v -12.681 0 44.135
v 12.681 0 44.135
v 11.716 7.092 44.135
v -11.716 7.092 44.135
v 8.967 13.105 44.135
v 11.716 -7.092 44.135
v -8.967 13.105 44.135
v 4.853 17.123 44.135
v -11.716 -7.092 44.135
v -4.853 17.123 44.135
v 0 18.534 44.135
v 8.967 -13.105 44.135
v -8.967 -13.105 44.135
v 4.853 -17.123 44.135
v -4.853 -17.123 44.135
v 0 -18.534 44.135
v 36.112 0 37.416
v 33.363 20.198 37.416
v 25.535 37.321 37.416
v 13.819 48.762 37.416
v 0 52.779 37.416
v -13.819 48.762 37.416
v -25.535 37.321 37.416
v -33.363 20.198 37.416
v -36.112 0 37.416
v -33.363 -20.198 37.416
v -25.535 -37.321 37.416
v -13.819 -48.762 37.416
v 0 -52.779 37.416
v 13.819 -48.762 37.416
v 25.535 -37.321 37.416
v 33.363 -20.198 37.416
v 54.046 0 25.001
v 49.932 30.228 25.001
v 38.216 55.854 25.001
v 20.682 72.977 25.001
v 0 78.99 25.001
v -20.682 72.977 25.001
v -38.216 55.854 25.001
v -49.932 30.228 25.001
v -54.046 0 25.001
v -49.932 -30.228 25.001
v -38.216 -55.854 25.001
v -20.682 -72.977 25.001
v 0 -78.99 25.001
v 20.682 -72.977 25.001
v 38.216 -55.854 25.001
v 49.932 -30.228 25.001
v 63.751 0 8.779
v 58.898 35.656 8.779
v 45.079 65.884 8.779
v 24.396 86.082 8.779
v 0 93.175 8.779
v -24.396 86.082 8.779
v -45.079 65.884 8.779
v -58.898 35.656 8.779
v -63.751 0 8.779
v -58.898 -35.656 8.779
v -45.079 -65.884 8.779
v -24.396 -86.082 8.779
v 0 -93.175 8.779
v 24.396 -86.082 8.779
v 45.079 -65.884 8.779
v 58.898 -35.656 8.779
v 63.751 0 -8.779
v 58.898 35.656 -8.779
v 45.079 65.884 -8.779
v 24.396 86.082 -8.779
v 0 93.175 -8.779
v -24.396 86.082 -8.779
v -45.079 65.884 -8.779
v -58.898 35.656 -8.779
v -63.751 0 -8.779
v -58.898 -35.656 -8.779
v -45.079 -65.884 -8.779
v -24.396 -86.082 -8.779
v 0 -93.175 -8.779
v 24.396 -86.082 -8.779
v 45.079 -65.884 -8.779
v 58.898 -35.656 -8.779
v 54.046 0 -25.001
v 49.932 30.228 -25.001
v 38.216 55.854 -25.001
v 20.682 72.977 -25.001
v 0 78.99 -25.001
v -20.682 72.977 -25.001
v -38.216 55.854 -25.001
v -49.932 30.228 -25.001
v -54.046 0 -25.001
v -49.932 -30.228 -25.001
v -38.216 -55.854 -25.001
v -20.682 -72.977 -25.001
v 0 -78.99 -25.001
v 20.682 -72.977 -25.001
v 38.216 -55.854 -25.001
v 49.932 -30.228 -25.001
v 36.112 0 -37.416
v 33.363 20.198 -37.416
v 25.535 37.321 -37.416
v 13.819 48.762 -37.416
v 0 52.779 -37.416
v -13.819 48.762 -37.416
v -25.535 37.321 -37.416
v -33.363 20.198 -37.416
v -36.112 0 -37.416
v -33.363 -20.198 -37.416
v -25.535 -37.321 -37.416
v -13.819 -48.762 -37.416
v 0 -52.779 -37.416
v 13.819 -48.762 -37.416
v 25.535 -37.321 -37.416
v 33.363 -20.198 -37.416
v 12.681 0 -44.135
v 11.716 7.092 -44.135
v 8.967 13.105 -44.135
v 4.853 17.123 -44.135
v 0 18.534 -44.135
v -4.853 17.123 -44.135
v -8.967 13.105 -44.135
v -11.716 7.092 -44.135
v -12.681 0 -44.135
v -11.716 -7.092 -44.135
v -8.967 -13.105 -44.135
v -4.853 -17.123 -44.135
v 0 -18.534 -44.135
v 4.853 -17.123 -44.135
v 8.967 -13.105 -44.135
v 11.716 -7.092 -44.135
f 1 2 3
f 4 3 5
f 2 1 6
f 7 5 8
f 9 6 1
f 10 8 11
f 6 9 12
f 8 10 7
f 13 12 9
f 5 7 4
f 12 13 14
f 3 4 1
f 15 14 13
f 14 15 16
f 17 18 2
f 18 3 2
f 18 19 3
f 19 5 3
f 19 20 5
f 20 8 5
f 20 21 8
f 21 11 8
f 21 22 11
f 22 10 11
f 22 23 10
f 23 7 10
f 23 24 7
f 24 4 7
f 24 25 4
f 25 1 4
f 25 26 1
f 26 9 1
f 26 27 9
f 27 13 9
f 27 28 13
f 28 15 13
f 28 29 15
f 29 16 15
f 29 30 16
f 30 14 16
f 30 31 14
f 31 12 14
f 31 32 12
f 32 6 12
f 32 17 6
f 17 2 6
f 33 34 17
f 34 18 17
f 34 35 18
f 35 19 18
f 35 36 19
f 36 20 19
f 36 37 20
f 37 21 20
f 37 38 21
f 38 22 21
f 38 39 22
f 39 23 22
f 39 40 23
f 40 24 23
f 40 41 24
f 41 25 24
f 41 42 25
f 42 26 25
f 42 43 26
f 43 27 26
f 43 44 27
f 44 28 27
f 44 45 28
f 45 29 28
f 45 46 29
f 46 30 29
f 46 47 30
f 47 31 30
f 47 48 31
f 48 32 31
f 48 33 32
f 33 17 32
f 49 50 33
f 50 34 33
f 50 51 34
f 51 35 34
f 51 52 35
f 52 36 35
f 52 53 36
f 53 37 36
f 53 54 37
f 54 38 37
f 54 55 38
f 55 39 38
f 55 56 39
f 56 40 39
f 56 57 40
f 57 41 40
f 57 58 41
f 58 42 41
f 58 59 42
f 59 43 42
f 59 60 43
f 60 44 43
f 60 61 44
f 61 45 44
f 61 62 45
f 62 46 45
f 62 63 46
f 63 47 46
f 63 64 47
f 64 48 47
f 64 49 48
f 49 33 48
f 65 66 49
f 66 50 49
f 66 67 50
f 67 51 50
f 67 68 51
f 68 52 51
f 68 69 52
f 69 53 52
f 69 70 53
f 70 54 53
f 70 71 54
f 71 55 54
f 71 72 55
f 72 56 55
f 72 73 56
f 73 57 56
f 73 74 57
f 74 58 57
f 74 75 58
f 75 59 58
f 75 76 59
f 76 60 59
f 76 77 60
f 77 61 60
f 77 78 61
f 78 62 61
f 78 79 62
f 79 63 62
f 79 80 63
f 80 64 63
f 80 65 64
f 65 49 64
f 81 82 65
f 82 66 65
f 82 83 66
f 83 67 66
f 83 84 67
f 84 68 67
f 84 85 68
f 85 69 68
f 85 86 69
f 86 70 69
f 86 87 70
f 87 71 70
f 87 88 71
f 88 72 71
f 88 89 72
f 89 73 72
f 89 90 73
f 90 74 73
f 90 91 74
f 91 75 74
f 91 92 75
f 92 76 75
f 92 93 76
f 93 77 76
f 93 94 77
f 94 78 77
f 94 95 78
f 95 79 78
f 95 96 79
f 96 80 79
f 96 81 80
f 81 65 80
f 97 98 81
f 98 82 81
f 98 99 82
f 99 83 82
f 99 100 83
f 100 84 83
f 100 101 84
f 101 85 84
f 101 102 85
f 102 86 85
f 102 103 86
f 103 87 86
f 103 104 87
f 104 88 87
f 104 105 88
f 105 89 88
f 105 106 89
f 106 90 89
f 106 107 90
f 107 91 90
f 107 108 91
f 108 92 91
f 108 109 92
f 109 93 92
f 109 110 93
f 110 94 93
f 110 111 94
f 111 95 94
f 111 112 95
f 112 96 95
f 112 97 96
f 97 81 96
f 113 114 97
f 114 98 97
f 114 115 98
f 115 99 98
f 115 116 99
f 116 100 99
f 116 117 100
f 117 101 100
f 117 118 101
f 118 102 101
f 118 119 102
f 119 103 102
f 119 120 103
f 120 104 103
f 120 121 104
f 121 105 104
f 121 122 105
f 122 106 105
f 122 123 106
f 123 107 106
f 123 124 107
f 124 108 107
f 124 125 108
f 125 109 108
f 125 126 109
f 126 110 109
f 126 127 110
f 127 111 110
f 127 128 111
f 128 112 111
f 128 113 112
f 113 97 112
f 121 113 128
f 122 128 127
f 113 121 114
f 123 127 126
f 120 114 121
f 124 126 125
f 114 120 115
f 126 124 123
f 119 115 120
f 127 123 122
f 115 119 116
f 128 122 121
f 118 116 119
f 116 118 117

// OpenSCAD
// Generated by SolidPython 1.0.1 on 2020-07-29 00:46:51


scale(v = [13, 19, 9]) {
	sphere(r = 5);
}
/***********************************************
*********      SolidPython code:      **********
************************************************
 
# import packages: SolidPython
from solid import *
from solid.utils import *
from itertools import chain, combinations, permutations


class Resize:

    def __init__(self, scad_file):
        self.scad_file = scad_file
        #self.scad_file = import_scad(scad_file)
        # cone/cylinder param:
        self.r1 = 0
        self.r2 = 0
        self.h = 0
        # rectangular prism param:
        self.w = 0
        self.l = 0
        # ellipse param:
        self.r = 0

    # import OpenScad code (file name corresponds to shape)


    # classify shape + parameters
    def assign(self, param1, param2, param3):
        if self.scad_file == 'cone.scad':
            self.r1 = param1
            self.r2 = param2
            self.h = param3
        elif self.scad_file == 'cylinder.scad':
            self.r1 = param1
            self.r2 = param2
            self.h = param3
        elif self.scad_file == 'rectangularPrism.scad':
            self.h = param1
            self.l = param2
            self.w = param3
        else:
            self.r = param1
            self.h = param2

    # resize parameters
    def iterate(self):
        x = range(3, 20, 2)
        i = 1
        if self.scad_file == 'cone.scad':
            tempList = list(permutations(x, 2))
            for temp in tempList:
                param1 = temp[0]
                param2 = temp[1]
                filepath = 'produced_scad_files/' + 'cone' + str(param1) + '_' + str(param2) + '_' + '.scad'
                scad_render_to_file(cylinder(h=param1, r1=param2, r2=0), filepath)

        elif self.scad_file == 'cylinder.scad':
            tempList = list(permutations(x, 3))
            for temp in tempList:
                param1 = temp[0]
                param2 = temp[1]
                filepath = 'produced_scad_files/' + 'cylinder' + str(param1) + '_' + str(param2) + '_' + '.scad'
                scad_render_to_file(cylinder(h=param1, r1=param2, r2=param2), filepath)

        elif self.scad_file == 'rectangularPrism.scad':
            tempList = list(permutations(x, 3))
            for temp in tempList:
                param1 = temp[0]
                param2 = temp[1]
                param3 = temp[2]
                filepath = 'produced_scad_files/' + 'rectangularPrism' + str(param1) + '_' + str(param2) + '_' + str(
                    param3) + '.scad'
                scad_render_to_file(cube(size=(param1, param2, param3)), filepath)

        elif self.scad_file == 'ellipse.scad':
            tempList = list(permutations(x, 4))
            for temp in tempList:
                param1 = temp[0]
                param2 = temp[1]
                param3 = temp[2]
                param4 = temp[3]
                filepath = 'produced_scad_files/' + 'ellipse' + str(param1) + '_' + str(param2) + '_' + str(param3) + '_' + str(param4) + '.scad'
                scad_render_to_file(scale([param1, param2, param3])(sphere(r=param4)), filepath)

    def render_to_scadfile(self):
        scad_render_to_file(scad, 'example.scad') 
 
************************************************/
